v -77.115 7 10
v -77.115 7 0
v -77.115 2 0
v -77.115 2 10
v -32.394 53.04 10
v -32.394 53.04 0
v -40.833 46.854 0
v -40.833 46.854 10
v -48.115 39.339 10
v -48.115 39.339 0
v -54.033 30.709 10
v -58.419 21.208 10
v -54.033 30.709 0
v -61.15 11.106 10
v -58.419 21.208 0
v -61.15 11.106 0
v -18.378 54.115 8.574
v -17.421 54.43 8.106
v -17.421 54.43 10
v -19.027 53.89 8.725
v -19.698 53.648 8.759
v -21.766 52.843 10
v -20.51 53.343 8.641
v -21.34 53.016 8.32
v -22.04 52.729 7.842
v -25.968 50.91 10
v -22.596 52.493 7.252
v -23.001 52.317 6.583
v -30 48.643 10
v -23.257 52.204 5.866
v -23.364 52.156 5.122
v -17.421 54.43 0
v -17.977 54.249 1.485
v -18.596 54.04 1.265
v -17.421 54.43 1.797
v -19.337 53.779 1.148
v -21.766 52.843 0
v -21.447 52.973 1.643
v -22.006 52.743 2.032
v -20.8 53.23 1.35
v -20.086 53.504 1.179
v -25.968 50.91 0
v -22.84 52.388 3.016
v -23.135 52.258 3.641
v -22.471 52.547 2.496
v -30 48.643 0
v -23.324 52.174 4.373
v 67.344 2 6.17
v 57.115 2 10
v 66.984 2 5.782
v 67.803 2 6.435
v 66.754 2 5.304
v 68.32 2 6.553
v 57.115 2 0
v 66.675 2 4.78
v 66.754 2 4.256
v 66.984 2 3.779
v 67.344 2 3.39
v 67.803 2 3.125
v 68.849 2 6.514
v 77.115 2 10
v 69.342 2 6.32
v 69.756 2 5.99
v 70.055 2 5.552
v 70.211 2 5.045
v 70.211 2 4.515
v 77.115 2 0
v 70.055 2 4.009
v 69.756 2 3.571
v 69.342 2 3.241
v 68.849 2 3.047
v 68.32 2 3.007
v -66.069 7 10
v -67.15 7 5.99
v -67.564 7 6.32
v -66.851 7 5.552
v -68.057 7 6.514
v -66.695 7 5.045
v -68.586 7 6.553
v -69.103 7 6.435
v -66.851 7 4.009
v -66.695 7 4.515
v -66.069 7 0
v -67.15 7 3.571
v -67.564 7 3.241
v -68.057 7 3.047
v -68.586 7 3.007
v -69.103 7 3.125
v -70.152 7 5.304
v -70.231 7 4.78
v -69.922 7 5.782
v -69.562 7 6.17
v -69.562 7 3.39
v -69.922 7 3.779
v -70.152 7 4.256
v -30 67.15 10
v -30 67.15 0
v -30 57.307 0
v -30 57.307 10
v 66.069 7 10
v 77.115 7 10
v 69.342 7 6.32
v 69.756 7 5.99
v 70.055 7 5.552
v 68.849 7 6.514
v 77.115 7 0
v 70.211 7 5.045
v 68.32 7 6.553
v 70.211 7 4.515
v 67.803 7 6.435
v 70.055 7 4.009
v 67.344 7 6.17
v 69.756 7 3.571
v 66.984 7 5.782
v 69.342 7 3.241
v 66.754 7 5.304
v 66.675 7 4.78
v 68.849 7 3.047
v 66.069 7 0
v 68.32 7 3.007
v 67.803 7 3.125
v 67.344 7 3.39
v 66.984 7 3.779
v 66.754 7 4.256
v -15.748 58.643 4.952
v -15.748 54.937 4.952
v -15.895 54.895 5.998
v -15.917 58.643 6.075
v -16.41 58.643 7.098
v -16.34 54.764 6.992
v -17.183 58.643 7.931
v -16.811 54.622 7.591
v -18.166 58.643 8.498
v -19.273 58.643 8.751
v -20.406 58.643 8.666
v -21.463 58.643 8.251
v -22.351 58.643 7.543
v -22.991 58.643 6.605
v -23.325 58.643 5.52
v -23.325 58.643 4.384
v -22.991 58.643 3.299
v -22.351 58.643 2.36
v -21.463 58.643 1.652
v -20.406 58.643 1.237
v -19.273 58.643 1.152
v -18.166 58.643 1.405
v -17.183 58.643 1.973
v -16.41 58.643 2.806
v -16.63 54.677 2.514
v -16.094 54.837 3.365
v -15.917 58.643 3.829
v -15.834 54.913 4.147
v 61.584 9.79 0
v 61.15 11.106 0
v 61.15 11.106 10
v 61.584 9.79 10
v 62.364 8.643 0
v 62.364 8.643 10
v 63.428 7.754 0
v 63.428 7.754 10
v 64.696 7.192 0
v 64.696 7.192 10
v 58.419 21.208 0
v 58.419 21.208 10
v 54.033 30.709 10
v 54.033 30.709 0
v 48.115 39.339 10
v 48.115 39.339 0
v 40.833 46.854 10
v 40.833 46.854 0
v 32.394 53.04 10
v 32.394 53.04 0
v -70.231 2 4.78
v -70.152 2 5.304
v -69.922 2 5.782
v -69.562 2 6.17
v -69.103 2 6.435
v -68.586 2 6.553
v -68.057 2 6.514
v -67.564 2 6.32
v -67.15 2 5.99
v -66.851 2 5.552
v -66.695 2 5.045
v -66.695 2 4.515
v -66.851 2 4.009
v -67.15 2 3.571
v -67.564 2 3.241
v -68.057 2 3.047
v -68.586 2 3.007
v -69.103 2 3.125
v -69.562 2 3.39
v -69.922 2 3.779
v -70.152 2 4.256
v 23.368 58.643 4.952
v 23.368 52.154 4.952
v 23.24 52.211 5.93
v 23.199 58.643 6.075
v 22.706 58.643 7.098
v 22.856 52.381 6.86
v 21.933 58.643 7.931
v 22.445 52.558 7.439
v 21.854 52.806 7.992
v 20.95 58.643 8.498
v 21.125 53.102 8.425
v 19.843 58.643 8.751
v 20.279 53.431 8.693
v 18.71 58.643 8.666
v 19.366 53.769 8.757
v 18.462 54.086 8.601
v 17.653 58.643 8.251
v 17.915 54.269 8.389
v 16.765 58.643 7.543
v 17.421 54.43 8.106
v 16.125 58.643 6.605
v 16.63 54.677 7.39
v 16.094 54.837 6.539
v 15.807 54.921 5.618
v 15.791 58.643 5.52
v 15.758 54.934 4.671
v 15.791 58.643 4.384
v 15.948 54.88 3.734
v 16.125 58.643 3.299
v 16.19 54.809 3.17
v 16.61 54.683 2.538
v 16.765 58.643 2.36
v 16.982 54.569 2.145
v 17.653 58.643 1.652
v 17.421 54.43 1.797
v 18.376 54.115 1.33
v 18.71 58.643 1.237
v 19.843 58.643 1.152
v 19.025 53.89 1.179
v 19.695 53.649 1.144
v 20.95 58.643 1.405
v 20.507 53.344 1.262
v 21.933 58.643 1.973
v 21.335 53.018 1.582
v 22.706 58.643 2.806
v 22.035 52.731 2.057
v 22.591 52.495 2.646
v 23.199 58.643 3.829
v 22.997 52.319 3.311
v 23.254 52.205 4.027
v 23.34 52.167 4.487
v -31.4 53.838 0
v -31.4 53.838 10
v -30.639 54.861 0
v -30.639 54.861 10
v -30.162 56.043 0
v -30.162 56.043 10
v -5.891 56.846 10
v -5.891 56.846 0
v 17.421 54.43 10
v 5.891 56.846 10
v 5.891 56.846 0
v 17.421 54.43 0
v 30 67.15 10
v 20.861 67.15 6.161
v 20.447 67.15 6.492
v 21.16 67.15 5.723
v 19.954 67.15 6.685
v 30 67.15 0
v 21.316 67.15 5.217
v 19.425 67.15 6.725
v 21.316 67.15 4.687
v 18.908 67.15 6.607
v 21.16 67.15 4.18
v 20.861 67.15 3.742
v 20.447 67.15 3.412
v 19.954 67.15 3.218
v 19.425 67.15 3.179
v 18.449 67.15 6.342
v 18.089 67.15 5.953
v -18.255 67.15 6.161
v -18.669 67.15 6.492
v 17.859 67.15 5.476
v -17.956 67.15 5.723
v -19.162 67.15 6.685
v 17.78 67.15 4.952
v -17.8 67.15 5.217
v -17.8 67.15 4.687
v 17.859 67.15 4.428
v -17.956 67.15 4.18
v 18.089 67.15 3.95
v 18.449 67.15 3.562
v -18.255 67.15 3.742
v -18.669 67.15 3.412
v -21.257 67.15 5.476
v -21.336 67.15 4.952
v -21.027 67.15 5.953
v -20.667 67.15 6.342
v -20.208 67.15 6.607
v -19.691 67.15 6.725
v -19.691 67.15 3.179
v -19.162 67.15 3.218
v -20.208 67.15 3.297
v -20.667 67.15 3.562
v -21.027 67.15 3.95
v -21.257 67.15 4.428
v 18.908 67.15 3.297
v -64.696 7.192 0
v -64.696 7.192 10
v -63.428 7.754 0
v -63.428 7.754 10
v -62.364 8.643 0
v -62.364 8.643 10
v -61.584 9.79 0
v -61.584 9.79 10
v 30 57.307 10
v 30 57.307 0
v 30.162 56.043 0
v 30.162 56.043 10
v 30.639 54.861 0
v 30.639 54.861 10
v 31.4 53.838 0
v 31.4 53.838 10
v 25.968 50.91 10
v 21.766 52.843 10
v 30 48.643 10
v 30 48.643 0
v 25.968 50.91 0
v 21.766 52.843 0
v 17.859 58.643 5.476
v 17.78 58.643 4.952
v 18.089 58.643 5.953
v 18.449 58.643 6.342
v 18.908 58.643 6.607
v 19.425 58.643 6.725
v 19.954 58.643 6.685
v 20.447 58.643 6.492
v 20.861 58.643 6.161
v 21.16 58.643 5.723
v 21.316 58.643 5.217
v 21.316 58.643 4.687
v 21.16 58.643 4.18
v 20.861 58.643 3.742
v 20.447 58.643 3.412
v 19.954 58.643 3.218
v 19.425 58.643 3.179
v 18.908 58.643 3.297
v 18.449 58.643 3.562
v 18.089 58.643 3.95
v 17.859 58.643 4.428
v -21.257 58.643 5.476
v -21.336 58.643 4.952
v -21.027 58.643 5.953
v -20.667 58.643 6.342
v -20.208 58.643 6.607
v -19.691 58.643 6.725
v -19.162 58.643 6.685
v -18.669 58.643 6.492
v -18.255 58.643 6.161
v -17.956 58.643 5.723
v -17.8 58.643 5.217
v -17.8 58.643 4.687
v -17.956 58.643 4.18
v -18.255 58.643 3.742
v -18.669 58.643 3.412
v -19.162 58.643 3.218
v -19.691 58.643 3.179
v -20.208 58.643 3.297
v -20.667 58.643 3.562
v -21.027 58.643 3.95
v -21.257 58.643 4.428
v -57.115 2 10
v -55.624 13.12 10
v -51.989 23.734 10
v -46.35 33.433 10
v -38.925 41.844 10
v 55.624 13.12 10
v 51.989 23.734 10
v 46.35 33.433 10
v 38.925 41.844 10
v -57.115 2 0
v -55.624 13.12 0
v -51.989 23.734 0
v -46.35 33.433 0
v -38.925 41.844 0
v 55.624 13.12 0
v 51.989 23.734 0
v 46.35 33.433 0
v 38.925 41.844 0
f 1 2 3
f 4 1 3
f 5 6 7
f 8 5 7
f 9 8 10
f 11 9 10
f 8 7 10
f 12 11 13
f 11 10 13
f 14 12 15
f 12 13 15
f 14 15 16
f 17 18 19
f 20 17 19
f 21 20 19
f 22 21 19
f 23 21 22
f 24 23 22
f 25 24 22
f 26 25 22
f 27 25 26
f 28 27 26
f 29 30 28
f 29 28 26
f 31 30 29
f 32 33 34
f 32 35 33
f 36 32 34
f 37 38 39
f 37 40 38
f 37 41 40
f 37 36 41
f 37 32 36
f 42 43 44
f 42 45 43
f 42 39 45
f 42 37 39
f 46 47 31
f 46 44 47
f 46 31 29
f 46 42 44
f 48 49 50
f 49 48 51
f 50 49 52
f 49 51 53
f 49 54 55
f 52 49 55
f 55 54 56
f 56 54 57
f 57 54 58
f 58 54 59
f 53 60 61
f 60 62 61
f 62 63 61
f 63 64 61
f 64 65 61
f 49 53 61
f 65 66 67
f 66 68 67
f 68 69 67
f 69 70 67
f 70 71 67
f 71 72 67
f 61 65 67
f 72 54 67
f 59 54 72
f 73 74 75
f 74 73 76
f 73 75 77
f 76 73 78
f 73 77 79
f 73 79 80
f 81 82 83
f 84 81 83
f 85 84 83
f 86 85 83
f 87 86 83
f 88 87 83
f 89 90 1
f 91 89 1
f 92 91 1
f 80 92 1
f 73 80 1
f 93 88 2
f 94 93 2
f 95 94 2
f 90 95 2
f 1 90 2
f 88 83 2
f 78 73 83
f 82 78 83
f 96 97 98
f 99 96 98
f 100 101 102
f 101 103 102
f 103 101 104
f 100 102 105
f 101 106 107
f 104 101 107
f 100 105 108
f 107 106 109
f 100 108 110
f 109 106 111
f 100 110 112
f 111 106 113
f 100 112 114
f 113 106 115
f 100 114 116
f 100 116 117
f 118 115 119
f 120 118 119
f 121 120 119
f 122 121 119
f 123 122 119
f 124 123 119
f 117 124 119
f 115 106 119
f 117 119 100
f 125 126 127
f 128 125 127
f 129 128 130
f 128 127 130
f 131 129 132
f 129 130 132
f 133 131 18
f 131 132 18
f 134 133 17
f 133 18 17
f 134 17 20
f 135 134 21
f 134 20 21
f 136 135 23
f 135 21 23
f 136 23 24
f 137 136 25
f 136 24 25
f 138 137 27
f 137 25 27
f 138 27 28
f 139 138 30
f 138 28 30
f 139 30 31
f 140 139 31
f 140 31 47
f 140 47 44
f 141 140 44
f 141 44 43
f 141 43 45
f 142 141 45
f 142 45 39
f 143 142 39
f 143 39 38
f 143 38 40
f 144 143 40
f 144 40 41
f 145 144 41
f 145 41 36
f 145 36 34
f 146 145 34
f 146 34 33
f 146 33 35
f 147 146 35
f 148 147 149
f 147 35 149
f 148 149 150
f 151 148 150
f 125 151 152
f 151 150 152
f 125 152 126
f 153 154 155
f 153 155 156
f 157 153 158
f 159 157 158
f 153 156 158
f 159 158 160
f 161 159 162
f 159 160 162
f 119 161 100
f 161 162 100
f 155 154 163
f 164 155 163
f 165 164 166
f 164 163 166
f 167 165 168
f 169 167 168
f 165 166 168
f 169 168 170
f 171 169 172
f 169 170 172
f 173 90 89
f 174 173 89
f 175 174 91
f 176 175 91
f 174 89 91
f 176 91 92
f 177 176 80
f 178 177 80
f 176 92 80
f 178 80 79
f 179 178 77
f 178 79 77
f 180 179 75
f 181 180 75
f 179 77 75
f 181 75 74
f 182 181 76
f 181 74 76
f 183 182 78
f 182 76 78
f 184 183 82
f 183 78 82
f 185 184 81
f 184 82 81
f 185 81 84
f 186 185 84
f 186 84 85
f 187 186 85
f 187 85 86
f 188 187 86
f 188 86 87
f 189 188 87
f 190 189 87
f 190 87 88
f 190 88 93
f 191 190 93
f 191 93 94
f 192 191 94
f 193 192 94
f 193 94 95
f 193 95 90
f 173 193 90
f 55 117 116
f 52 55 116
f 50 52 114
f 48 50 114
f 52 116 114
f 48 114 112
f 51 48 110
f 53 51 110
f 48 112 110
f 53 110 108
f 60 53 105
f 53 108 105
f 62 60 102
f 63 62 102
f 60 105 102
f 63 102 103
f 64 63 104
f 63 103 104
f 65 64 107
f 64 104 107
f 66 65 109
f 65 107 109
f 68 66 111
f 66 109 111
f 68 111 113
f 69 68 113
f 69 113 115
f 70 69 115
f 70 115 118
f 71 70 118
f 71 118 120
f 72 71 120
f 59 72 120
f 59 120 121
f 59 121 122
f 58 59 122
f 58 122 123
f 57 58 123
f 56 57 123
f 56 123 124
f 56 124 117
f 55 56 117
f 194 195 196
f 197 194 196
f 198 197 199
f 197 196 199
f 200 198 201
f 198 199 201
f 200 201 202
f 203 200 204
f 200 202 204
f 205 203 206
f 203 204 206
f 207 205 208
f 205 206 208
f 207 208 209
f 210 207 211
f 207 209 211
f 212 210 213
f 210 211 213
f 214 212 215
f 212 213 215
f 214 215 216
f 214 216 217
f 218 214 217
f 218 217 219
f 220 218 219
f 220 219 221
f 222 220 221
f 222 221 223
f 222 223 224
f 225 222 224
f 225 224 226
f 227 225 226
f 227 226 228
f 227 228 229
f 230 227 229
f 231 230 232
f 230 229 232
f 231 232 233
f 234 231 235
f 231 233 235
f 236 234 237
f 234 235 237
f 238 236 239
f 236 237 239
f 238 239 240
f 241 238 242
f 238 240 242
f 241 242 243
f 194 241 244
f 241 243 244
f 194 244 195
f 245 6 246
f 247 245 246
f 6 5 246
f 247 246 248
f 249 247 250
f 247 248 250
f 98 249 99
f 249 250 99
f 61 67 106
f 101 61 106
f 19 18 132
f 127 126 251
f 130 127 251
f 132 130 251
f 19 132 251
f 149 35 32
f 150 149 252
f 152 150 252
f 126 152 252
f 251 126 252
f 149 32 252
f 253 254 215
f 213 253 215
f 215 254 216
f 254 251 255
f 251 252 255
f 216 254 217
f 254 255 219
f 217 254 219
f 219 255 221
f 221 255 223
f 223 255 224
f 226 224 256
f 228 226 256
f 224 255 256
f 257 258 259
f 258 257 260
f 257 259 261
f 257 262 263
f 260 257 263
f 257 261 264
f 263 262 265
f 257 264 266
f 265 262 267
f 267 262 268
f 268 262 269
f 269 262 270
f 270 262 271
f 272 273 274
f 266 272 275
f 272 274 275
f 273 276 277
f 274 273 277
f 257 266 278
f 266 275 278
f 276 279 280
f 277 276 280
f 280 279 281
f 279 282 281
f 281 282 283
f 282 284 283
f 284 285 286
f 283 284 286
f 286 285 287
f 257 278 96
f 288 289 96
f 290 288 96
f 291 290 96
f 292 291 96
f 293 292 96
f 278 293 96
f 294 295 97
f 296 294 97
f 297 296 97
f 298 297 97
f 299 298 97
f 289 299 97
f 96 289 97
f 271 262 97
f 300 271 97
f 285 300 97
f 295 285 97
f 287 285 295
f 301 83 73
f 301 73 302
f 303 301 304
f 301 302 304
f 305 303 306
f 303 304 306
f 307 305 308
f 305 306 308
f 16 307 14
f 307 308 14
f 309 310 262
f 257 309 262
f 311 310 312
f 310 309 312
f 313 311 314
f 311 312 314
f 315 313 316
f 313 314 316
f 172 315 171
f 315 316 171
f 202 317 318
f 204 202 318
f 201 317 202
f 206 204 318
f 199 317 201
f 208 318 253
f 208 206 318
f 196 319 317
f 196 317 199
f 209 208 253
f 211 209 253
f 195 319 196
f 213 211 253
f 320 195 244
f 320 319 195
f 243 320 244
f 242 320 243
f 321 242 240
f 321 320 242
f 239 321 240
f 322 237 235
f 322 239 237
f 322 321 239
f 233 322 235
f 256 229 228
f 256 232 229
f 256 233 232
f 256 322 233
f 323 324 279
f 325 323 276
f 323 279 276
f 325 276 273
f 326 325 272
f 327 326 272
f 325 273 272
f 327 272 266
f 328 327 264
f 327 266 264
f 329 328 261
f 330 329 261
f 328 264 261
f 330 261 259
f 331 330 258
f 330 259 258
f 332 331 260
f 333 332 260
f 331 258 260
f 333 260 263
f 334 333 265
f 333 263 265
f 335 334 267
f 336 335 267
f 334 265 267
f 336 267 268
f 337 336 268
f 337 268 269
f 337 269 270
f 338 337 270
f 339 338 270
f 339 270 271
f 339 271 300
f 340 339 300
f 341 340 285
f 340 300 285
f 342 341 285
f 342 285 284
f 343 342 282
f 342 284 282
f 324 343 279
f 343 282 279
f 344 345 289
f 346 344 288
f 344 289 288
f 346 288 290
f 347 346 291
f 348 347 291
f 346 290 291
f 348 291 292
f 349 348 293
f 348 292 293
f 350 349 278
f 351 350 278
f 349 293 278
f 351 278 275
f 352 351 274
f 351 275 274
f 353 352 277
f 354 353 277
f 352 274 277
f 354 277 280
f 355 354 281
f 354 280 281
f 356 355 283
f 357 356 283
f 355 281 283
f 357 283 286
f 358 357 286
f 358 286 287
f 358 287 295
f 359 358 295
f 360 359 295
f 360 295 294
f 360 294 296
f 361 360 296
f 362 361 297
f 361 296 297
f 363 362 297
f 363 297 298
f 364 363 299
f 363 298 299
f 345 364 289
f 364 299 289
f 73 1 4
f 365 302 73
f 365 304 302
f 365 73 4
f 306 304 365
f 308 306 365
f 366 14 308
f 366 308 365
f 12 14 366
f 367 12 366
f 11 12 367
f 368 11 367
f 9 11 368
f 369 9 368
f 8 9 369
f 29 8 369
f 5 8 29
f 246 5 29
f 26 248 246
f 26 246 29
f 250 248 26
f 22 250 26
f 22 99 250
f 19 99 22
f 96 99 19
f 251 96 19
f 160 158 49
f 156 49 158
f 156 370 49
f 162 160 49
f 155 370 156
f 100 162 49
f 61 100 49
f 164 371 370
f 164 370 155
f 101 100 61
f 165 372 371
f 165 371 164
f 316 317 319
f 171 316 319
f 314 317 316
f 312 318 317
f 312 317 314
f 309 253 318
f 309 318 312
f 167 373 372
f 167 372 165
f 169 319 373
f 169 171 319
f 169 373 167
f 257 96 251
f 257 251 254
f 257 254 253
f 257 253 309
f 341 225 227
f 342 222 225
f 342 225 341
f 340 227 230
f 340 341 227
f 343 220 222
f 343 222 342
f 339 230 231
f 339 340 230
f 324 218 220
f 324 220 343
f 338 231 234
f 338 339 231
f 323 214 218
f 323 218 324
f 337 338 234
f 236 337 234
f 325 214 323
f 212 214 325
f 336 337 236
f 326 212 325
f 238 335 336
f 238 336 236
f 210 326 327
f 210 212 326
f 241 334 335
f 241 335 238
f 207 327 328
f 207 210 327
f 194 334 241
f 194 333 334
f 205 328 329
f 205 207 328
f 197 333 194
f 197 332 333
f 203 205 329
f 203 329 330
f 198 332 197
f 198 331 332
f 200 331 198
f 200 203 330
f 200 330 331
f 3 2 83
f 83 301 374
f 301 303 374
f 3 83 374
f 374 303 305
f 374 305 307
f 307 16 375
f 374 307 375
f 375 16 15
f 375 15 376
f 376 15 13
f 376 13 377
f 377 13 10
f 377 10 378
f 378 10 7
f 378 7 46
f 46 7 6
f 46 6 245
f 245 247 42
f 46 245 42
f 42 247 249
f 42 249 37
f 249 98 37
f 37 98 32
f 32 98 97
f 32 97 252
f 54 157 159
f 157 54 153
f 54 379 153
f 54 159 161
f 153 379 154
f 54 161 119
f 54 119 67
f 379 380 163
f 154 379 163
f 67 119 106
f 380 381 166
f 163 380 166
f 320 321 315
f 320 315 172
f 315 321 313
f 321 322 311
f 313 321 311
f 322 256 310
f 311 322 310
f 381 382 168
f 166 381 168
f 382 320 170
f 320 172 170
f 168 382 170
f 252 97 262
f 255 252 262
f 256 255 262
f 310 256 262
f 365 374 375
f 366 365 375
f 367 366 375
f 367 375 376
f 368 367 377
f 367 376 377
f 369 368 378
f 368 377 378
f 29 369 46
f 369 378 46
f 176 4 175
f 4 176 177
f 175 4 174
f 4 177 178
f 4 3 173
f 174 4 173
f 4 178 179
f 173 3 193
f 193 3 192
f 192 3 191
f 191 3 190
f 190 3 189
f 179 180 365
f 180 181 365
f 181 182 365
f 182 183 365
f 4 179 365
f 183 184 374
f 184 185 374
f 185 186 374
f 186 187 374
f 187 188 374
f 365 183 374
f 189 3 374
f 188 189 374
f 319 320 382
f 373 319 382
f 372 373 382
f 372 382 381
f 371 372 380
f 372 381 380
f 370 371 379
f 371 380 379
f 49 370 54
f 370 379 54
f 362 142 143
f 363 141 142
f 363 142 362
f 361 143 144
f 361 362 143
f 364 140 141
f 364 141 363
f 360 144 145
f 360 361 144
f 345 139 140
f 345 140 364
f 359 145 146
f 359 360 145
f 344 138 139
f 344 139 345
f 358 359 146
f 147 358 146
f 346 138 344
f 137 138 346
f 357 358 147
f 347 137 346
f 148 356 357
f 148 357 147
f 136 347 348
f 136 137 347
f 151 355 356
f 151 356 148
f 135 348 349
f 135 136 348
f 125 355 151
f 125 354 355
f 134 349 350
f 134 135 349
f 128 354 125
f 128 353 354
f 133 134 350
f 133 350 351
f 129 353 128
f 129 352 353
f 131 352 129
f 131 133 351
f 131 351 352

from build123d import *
from build123d import SkipClean  # not in build123d's __all__

# Parameters (mm, degrees)
F1_DEPTH       = 10
F3_D           = 3.556
F3_CBORE_D     = 7.62
F3_CBORE_DEPTH = 10
F4_DEPTH       = 10.0010001
F6_D           = 3.556
F7_R           = 5


with BuildPart() as f1:
    # F0 (on Top) → F1 (new body)
    with BuildSketch(Plane.XY):
        with BuildLine():
            ThreePointArc((30, 48.6428052234), (49.4079280032, 28.7224502859), (57.1149936532, 2))
            Line((57.1149936532, 2), (57.1149936532, 7))
            Line((57.1149936532, 7), (61.7545342465, 7))
            ThreePointArc((61.7545342465, 7), (51.6442091706, 34.5759766187), (30, 54.4299779533))
            Line((30, 54.4299779533), (30, 48.6428052234))
        make_face()
        with BuildLine():
            ThreePointArc((17.4212513902, 54.4299779533), (23.8865362266, 51.9187431194), (30, 48.6428052234))
            Line((30, 48.6428052234), (30, 54.4299779533))
            Line((30, 54.4299779533), (17.4212513902, 54.4299779533))
        make_face()
        with BuildLine():
            ThreePointArc((-17.4212513902, 54.4299779533), (0, 57.15), (17.4212513902, 54.4299779533))
            Line((17.4212513902, 54.4299779533), (30, 54.4299779533))
            ThreePointArc((30, 54.4299779533), (15.4886954339, 60.1890589207), (7.62e-08, 62.15))
            ThreePointArc((7.62e-08, 62.15), (-15.4886953601, 60.1890589397), (-30, 54.4299779533))
            Line((-30, 54.4299779533), (-17.4212513902, 54.4299779533))
        make_face()
        with BuildLine():
            Line((-30, 54.4299779533), (-30, 48.6428052234))
            ThreePointArc((-30, 48.6428052234), (-23.8865362266, 51.9187431194), (-17.4212513902, 54.4299779533))
            Line((-17.4212513902, 54.4299779533), (-30, 54.4299779533))
        make_face()
        with BuildLine():
            ThreePointArc((-57.1149936532, 2), (-49.4079280032, 28.7224502859), (-30, 48.6428052234))
            Line((-30, 48.6428052234), (-30, 54.4299779533))
            ThreePointArc((-30, 54.4299779533), (-51.6442091706, 34.5759766187), (-61.7545342465, 7))
            Line((-61.7545342465, 7), (-57.1149936532, 7))
            Line((-57.1149936532, 7), (-57.1149936532, 2))
        make_face()
        with BuildLine():
            Line((-77.1149936532, 2), (-62.1178114553, 2))
            ThreePointArc((-62.1178114553, 2), (-61.9866074843, 4.5036643506), (-61.7545342465, 7))
            Line((-61.7545342465, 7), (-77.1149936532, 7))
            Line((-77.1149936532, 7), (-77.1149936532, 2))
        make_face()
        with BuildLine():
            Line((-62.1178114553, 2), (-57.1149936532, 2))
            Line((-57.1149936532, 2), (-57.1149936532, 7))
            Line((-57.1149936532, 7), (-61.7545342465, 7))
            ThreePointArc((-61.7545342465, 7), (-61.9866074843, 4.5036643506), (-62.1178114553, 2))
        make_face()
        with BuildLine():
            Line((57.1149936532, 7), (57.1149936532, 2))
            Line((57.1149936532, 2), (62.1178114553, 2))
            ThreePointArc((62.1178114553, 2), (61.9866074843, 4.5036643506), (61.7545342465, 7))
            Line((61.7545342465, 7), (57.1149936532, 7))
        make_face()
        with BuildLine():
            ThreePointArc((61.7545342465, 7), (61.9866074843, 4.5036643506), (62.1178114553, 2))
            Line((62.1178114553, 2), (77.1149936532, 2))
            Line((77.1149936532, 2), (77.1149936532, 7))
            Line((77.1149936532, 7), (61.7545342465, 7))
        make_face()
        with BuildLine():
            Line((-30, 62.15), (-30, 54.4299779533))
            ThreePointArc((-30, 54.4299779533), (-15.4886953601, 60.1890589397), (7.62e-08, 62.15))
            Line((7.62e-08, 62.15), (-30, 62.15))
        make_face()
        with BuildLine():
            ThreePointArc((7.62e-08, 62.15), (15.4886954339, 60.1890589207), (30, 54.4299779533))
            Line((30, 54.4299779533), (30, 62.15))
            Line((30, 62.15), (7.62e-08, 62.15))
        make_face()
        with BuildLine():
            Line((-30, 48.6428052234), (30, 48.6428052234))
            ThreePointArc((30, 48.6428052234), (23.8865362266, 51.9187431194), (17.4212513902, 54.4299779533))
            Line((17.4212513902, 54.4299779533), (-17.4212513902, 54.4299779533))
            ThreePointArc((-17.4212513902, 54.4299779533), (-23.8865362266, 51.9187431194), (-30, 48.6428052234))
        make_face()
        Polygon((-30, 62.15), (7.62e-08, 62.15), (30, 62.15), (30, 67.15), (-30, 67.15), align=None)
    extrude(amount=F1_DEPTH)

    # F3 (through all)
    with Locations(Plane.XZ.offset(-48.6428052234)):
        with Locations((-19.558, 4.9517820589), (19.558, 4.9517820589)):
            CounterBoreHole(F3_D / 2, F3_CBORE_D / 2, F3_CBORE_DEPTH)

    # F0 (on Top) → F4 (cut, through all)
    with BuildSketch(Plane.XY):
        with BuildLine():
            Line((-30, 48.6428052234), (30, 48.6428052234))
            ThreePointArc((30, 48.6428052234), (23.8865362266, 51.9187431194), (17.4212513902, 54.4299779533))
            Line((17.4212513902, 54.4299779533), (-17.4212513902, 54.4299779533))
            ThreePointArc((-17.4212513902, 54.4299779533), (-23.8865362266, 51.9187431194), (-30, 48.6428052234))
        make_face()
    with SkipClean():  # cleaning this boolean's faces spoils the solid; the shape is the same uncleaned
        extrude(amount=F4_DEPTH, mode=Mode.SUBTRACT)

    # F6 (through all)
    with Locations(Plane.XZ.offset(-2)):
        with Locations((-68.453, 4.78035165), (68.453, 4.78035165)):
            Hole(F6_D / 2)

    # F7
    f7_edges = [f1.edges().sort_by_distance(p)[0] for p in [
        (-61.754534, 7, 5),
        (61.754534, 7, 5),
        (30, 54.429978, 5),
        (-30, 54.429978, 5),
    ]]
    fillet(f7_edges, radius=F7_R)


solid = f1.part
